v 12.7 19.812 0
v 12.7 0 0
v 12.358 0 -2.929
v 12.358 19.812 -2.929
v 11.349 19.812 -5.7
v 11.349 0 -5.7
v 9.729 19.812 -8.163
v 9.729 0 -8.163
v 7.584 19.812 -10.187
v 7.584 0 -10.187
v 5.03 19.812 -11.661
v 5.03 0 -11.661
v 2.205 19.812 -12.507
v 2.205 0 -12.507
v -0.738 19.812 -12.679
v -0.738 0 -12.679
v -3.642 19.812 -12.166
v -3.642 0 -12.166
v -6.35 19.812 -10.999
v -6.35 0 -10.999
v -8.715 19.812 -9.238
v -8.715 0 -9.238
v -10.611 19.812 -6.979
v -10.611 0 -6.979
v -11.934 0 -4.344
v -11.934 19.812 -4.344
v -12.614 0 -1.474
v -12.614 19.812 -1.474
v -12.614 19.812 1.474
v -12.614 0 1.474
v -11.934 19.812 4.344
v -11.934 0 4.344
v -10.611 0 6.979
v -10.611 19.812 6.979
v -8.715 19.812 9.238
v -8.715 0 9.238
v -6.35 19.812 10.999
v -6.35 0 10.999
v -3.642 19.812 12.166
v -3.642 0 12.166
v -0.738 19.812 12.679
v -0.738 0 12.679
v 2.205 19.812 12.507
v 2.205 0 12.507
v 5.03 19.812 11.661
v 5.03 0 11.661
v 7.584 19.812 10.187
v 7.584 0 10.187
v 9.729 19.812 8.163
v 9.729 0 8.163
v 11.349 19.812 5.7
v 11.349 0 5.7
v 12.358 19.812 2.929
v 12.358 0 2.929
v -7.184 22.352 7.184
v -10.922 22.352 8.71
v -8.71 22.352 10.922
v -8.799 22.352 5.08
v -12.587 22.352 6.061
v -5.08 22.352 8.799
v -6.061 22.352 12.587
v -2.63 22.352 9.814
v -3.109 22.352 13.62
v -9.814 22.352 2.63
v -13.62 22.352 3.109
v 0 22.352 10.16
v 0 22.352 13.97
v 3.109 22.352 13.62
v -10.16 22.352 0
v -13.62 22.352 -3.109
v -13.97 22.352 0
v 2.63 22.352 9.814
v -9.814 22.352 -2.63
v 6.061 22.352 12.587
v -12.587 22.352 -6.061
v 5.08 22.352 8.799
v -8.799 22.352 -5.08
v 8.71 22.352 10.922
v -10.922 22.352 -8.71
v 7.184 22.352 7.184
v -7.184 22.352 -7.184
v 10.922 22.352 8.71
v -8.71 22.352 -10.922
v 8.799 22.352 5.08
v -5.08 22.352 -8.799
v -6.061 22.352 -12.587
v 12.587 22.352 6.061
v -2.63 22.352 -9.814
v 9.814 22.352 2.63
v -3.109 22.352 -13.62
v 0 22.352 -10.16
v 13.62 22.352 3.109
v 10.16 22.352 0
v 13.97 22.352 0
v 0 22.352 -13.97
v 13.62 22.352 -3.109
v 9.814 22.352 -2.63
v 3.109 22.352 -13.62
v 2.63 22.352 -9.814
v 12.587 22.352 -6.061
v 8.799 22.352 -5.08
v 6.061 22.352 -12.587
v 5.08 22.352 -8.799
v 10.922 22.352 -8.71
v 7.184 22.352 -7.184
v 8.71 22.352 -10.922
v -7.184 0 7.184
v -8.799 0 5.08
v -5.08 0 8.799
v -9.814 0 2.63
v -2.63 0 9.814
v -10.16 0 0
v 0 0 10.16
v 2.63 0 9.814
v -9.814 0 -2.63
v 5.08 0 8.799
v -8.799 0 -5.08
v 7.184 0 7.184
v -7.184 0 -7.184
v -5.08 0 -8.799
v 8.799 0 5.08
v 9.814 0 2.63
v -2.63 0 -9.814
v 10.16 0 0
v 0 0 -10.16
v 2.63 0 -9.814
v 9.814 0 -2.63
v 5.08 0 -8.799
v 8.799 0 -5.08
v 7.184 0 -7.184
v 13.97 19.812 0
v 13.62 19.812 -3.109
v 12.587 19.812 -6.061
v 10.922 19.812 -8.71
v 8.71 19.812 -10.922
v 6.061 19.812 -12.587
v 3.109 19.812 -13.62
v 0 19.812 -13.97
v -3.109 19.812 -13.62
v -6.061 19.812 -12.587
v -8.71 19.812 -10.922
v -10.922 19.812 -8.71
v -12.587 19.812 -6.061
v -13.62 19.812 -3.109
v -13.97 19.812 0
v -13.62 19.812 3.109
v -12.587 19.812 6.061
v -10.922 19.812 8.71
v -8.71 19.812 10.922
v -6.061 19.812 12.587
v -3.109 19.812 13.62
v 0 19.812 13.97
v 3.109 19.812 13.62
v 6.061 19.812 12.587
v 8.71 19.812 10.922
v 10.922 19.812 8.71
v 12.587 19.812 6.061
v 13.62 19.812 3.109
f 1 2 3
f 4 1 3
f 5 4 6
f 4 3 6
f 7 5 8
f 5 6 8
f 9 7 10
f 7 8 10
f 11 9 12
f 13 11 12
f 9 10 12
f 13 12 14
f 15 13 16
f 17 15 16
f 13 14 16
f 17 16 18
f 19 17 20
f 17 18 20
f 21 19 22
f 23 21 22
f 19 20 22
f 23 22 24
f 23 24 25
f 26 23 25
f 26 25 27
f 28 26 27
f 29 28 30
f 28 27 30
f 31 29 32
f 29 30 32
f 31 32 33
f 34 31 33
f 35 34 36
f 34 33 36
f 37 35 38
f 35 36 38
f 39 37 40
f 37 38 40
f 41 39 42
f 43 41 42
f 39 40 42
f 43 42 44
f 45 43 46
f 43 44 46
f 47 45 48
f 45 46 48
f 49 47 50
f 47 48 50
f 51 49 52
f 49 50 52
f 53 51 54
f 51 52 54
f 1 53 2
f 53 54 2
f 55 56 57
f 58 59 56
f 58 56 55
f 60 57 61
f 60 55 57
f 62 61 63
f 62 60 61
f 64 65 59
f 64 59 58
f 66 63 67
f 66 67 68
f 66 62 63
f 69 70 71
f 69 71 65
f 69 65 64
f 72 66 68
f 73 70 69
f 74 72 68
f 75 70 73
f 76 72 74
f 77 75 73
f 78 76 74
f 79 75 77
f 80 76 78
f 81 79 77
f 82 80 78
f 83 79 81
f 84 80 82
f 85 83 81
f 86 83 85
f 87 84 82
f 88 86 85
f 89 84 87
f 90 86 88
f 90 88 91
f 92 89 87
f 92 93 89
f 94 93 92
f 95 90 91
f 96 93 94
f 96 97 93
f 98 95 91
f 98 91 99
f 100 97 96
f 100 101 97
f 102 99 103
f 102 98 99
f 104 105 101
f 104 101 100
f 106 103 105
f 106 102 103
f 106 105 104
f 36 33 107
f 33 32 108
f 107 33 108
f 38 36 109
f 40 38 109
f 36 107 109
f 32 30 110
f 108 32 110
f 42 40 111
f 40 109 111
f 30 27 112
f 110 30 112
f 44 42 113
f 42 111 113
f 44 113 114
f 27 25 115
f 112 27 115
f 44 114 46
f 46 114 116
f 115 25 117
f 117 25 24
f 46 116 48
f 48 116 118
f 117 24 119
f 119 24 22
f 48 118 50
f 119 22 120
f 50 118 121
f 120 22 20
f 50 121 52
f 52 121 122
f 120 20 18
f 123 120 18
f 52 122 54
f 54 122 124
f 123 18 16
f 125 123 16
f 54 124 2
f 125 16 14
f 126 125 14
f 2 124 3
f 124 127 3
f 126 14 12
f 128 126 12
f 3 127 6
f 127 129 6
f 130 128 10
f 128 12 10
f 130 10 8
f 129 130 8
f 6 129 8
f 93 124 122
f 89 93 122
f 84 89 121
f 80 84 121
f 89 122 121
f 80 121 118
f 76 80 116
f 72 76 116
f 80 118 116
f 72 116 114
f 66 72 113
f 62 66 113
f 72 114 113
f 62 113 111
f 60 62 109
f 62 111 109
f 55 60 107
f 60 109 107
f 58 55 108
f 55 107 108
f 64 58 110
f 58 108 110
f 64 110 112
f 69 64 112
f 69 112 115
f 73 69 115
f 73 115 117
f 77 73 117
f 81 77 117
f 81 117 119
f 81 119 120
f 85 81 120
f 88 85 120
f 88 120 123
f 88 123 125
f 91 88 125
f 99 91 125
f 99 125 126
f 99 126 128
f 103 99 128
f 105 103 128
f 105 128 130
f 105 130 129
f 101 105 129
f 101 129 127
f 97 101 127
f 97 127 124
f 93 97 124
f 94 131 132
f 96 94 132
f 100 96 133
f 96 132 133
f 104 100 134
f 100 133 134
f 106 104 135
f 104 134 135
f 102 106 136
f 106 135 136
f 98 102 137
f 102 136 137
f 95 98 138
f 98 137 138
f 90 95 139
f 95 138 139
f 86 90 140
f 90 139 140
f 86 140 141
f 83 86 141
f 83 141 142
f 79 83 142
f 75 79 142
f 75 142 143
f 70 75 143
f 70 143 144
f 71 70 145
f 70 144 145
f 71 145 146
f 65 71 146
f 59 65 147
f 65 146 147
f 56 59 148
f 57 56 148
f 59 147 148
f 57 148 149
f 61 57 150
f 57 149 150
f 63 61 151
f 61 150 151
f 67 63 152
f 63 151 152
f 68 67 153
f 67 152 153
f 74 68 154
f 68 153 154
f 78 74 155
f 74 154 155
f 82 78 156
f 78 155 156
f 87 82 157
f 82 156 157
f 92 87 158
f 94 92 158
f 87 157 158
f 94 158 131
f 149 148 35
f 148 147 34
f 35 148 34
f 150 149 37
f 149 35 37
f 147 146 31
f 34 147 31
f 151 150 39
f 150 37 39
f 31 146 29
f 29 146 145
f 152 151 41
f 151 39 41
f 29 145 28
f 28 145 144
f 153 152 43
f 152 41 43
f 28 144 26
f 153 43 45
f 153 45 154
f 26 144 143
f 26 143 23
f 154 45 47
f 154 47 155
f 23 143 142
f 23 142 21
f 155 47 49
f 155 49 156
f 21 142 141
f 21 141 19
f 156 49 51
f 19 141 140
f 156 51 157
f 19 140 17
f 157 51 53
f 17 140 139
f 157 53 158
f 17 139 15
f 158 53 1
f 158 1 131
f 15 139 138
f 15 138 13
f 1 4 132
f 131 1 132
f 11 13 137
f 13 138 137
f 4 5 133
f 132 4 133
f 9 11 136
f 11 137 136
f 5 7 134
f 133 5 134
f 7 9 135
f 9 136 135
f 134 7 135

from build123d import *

# Parameters (mm, degrees)
SKETCH1_R           = 12.7
BOSS_EXTRUDE1_DEPTH = 19.812
SKETCH2_R           = 13.97
BOSS_EXTRUDE2_DEPTH = 2.54
SKETCH3_R           = 10.16
CUT_EXTRUDE1_DEPTH  = 23.352


with BuildPart() as part:
    # Sketch1 → Boss-Extrude1 (new body)
    with BuildSketch(Plane(origin=(0, 0, 0), x_dir=(1, 0, 0), z_dir=(0, 1, 0))):
        Circle(SKETCH1_R)
    extrude(amount=BOSS_EXTRUDE1_DEPTH)

    # Sketch2 → Boss-Extrude2 (add)
    with BuildSketch(Plane(origin=(0, 19.812, 0), x_dir=(1, 0, 0), z_dir=(0, 1, 0))):
        Circle(SKETCH2_R)
    extrude(amount=BOSS_EXTRUDE2_DEPTH)

    # Sketch3 → Cut-Extrude1 (cut, through all)
    with BuildSketch(Plane.XZ):
        Circle(SKETCH3_R)
    extrude(amount=-CUT_EXTRUDE1_DEPTH, mode=Mode.SUBTRACT)


solid = part.part
